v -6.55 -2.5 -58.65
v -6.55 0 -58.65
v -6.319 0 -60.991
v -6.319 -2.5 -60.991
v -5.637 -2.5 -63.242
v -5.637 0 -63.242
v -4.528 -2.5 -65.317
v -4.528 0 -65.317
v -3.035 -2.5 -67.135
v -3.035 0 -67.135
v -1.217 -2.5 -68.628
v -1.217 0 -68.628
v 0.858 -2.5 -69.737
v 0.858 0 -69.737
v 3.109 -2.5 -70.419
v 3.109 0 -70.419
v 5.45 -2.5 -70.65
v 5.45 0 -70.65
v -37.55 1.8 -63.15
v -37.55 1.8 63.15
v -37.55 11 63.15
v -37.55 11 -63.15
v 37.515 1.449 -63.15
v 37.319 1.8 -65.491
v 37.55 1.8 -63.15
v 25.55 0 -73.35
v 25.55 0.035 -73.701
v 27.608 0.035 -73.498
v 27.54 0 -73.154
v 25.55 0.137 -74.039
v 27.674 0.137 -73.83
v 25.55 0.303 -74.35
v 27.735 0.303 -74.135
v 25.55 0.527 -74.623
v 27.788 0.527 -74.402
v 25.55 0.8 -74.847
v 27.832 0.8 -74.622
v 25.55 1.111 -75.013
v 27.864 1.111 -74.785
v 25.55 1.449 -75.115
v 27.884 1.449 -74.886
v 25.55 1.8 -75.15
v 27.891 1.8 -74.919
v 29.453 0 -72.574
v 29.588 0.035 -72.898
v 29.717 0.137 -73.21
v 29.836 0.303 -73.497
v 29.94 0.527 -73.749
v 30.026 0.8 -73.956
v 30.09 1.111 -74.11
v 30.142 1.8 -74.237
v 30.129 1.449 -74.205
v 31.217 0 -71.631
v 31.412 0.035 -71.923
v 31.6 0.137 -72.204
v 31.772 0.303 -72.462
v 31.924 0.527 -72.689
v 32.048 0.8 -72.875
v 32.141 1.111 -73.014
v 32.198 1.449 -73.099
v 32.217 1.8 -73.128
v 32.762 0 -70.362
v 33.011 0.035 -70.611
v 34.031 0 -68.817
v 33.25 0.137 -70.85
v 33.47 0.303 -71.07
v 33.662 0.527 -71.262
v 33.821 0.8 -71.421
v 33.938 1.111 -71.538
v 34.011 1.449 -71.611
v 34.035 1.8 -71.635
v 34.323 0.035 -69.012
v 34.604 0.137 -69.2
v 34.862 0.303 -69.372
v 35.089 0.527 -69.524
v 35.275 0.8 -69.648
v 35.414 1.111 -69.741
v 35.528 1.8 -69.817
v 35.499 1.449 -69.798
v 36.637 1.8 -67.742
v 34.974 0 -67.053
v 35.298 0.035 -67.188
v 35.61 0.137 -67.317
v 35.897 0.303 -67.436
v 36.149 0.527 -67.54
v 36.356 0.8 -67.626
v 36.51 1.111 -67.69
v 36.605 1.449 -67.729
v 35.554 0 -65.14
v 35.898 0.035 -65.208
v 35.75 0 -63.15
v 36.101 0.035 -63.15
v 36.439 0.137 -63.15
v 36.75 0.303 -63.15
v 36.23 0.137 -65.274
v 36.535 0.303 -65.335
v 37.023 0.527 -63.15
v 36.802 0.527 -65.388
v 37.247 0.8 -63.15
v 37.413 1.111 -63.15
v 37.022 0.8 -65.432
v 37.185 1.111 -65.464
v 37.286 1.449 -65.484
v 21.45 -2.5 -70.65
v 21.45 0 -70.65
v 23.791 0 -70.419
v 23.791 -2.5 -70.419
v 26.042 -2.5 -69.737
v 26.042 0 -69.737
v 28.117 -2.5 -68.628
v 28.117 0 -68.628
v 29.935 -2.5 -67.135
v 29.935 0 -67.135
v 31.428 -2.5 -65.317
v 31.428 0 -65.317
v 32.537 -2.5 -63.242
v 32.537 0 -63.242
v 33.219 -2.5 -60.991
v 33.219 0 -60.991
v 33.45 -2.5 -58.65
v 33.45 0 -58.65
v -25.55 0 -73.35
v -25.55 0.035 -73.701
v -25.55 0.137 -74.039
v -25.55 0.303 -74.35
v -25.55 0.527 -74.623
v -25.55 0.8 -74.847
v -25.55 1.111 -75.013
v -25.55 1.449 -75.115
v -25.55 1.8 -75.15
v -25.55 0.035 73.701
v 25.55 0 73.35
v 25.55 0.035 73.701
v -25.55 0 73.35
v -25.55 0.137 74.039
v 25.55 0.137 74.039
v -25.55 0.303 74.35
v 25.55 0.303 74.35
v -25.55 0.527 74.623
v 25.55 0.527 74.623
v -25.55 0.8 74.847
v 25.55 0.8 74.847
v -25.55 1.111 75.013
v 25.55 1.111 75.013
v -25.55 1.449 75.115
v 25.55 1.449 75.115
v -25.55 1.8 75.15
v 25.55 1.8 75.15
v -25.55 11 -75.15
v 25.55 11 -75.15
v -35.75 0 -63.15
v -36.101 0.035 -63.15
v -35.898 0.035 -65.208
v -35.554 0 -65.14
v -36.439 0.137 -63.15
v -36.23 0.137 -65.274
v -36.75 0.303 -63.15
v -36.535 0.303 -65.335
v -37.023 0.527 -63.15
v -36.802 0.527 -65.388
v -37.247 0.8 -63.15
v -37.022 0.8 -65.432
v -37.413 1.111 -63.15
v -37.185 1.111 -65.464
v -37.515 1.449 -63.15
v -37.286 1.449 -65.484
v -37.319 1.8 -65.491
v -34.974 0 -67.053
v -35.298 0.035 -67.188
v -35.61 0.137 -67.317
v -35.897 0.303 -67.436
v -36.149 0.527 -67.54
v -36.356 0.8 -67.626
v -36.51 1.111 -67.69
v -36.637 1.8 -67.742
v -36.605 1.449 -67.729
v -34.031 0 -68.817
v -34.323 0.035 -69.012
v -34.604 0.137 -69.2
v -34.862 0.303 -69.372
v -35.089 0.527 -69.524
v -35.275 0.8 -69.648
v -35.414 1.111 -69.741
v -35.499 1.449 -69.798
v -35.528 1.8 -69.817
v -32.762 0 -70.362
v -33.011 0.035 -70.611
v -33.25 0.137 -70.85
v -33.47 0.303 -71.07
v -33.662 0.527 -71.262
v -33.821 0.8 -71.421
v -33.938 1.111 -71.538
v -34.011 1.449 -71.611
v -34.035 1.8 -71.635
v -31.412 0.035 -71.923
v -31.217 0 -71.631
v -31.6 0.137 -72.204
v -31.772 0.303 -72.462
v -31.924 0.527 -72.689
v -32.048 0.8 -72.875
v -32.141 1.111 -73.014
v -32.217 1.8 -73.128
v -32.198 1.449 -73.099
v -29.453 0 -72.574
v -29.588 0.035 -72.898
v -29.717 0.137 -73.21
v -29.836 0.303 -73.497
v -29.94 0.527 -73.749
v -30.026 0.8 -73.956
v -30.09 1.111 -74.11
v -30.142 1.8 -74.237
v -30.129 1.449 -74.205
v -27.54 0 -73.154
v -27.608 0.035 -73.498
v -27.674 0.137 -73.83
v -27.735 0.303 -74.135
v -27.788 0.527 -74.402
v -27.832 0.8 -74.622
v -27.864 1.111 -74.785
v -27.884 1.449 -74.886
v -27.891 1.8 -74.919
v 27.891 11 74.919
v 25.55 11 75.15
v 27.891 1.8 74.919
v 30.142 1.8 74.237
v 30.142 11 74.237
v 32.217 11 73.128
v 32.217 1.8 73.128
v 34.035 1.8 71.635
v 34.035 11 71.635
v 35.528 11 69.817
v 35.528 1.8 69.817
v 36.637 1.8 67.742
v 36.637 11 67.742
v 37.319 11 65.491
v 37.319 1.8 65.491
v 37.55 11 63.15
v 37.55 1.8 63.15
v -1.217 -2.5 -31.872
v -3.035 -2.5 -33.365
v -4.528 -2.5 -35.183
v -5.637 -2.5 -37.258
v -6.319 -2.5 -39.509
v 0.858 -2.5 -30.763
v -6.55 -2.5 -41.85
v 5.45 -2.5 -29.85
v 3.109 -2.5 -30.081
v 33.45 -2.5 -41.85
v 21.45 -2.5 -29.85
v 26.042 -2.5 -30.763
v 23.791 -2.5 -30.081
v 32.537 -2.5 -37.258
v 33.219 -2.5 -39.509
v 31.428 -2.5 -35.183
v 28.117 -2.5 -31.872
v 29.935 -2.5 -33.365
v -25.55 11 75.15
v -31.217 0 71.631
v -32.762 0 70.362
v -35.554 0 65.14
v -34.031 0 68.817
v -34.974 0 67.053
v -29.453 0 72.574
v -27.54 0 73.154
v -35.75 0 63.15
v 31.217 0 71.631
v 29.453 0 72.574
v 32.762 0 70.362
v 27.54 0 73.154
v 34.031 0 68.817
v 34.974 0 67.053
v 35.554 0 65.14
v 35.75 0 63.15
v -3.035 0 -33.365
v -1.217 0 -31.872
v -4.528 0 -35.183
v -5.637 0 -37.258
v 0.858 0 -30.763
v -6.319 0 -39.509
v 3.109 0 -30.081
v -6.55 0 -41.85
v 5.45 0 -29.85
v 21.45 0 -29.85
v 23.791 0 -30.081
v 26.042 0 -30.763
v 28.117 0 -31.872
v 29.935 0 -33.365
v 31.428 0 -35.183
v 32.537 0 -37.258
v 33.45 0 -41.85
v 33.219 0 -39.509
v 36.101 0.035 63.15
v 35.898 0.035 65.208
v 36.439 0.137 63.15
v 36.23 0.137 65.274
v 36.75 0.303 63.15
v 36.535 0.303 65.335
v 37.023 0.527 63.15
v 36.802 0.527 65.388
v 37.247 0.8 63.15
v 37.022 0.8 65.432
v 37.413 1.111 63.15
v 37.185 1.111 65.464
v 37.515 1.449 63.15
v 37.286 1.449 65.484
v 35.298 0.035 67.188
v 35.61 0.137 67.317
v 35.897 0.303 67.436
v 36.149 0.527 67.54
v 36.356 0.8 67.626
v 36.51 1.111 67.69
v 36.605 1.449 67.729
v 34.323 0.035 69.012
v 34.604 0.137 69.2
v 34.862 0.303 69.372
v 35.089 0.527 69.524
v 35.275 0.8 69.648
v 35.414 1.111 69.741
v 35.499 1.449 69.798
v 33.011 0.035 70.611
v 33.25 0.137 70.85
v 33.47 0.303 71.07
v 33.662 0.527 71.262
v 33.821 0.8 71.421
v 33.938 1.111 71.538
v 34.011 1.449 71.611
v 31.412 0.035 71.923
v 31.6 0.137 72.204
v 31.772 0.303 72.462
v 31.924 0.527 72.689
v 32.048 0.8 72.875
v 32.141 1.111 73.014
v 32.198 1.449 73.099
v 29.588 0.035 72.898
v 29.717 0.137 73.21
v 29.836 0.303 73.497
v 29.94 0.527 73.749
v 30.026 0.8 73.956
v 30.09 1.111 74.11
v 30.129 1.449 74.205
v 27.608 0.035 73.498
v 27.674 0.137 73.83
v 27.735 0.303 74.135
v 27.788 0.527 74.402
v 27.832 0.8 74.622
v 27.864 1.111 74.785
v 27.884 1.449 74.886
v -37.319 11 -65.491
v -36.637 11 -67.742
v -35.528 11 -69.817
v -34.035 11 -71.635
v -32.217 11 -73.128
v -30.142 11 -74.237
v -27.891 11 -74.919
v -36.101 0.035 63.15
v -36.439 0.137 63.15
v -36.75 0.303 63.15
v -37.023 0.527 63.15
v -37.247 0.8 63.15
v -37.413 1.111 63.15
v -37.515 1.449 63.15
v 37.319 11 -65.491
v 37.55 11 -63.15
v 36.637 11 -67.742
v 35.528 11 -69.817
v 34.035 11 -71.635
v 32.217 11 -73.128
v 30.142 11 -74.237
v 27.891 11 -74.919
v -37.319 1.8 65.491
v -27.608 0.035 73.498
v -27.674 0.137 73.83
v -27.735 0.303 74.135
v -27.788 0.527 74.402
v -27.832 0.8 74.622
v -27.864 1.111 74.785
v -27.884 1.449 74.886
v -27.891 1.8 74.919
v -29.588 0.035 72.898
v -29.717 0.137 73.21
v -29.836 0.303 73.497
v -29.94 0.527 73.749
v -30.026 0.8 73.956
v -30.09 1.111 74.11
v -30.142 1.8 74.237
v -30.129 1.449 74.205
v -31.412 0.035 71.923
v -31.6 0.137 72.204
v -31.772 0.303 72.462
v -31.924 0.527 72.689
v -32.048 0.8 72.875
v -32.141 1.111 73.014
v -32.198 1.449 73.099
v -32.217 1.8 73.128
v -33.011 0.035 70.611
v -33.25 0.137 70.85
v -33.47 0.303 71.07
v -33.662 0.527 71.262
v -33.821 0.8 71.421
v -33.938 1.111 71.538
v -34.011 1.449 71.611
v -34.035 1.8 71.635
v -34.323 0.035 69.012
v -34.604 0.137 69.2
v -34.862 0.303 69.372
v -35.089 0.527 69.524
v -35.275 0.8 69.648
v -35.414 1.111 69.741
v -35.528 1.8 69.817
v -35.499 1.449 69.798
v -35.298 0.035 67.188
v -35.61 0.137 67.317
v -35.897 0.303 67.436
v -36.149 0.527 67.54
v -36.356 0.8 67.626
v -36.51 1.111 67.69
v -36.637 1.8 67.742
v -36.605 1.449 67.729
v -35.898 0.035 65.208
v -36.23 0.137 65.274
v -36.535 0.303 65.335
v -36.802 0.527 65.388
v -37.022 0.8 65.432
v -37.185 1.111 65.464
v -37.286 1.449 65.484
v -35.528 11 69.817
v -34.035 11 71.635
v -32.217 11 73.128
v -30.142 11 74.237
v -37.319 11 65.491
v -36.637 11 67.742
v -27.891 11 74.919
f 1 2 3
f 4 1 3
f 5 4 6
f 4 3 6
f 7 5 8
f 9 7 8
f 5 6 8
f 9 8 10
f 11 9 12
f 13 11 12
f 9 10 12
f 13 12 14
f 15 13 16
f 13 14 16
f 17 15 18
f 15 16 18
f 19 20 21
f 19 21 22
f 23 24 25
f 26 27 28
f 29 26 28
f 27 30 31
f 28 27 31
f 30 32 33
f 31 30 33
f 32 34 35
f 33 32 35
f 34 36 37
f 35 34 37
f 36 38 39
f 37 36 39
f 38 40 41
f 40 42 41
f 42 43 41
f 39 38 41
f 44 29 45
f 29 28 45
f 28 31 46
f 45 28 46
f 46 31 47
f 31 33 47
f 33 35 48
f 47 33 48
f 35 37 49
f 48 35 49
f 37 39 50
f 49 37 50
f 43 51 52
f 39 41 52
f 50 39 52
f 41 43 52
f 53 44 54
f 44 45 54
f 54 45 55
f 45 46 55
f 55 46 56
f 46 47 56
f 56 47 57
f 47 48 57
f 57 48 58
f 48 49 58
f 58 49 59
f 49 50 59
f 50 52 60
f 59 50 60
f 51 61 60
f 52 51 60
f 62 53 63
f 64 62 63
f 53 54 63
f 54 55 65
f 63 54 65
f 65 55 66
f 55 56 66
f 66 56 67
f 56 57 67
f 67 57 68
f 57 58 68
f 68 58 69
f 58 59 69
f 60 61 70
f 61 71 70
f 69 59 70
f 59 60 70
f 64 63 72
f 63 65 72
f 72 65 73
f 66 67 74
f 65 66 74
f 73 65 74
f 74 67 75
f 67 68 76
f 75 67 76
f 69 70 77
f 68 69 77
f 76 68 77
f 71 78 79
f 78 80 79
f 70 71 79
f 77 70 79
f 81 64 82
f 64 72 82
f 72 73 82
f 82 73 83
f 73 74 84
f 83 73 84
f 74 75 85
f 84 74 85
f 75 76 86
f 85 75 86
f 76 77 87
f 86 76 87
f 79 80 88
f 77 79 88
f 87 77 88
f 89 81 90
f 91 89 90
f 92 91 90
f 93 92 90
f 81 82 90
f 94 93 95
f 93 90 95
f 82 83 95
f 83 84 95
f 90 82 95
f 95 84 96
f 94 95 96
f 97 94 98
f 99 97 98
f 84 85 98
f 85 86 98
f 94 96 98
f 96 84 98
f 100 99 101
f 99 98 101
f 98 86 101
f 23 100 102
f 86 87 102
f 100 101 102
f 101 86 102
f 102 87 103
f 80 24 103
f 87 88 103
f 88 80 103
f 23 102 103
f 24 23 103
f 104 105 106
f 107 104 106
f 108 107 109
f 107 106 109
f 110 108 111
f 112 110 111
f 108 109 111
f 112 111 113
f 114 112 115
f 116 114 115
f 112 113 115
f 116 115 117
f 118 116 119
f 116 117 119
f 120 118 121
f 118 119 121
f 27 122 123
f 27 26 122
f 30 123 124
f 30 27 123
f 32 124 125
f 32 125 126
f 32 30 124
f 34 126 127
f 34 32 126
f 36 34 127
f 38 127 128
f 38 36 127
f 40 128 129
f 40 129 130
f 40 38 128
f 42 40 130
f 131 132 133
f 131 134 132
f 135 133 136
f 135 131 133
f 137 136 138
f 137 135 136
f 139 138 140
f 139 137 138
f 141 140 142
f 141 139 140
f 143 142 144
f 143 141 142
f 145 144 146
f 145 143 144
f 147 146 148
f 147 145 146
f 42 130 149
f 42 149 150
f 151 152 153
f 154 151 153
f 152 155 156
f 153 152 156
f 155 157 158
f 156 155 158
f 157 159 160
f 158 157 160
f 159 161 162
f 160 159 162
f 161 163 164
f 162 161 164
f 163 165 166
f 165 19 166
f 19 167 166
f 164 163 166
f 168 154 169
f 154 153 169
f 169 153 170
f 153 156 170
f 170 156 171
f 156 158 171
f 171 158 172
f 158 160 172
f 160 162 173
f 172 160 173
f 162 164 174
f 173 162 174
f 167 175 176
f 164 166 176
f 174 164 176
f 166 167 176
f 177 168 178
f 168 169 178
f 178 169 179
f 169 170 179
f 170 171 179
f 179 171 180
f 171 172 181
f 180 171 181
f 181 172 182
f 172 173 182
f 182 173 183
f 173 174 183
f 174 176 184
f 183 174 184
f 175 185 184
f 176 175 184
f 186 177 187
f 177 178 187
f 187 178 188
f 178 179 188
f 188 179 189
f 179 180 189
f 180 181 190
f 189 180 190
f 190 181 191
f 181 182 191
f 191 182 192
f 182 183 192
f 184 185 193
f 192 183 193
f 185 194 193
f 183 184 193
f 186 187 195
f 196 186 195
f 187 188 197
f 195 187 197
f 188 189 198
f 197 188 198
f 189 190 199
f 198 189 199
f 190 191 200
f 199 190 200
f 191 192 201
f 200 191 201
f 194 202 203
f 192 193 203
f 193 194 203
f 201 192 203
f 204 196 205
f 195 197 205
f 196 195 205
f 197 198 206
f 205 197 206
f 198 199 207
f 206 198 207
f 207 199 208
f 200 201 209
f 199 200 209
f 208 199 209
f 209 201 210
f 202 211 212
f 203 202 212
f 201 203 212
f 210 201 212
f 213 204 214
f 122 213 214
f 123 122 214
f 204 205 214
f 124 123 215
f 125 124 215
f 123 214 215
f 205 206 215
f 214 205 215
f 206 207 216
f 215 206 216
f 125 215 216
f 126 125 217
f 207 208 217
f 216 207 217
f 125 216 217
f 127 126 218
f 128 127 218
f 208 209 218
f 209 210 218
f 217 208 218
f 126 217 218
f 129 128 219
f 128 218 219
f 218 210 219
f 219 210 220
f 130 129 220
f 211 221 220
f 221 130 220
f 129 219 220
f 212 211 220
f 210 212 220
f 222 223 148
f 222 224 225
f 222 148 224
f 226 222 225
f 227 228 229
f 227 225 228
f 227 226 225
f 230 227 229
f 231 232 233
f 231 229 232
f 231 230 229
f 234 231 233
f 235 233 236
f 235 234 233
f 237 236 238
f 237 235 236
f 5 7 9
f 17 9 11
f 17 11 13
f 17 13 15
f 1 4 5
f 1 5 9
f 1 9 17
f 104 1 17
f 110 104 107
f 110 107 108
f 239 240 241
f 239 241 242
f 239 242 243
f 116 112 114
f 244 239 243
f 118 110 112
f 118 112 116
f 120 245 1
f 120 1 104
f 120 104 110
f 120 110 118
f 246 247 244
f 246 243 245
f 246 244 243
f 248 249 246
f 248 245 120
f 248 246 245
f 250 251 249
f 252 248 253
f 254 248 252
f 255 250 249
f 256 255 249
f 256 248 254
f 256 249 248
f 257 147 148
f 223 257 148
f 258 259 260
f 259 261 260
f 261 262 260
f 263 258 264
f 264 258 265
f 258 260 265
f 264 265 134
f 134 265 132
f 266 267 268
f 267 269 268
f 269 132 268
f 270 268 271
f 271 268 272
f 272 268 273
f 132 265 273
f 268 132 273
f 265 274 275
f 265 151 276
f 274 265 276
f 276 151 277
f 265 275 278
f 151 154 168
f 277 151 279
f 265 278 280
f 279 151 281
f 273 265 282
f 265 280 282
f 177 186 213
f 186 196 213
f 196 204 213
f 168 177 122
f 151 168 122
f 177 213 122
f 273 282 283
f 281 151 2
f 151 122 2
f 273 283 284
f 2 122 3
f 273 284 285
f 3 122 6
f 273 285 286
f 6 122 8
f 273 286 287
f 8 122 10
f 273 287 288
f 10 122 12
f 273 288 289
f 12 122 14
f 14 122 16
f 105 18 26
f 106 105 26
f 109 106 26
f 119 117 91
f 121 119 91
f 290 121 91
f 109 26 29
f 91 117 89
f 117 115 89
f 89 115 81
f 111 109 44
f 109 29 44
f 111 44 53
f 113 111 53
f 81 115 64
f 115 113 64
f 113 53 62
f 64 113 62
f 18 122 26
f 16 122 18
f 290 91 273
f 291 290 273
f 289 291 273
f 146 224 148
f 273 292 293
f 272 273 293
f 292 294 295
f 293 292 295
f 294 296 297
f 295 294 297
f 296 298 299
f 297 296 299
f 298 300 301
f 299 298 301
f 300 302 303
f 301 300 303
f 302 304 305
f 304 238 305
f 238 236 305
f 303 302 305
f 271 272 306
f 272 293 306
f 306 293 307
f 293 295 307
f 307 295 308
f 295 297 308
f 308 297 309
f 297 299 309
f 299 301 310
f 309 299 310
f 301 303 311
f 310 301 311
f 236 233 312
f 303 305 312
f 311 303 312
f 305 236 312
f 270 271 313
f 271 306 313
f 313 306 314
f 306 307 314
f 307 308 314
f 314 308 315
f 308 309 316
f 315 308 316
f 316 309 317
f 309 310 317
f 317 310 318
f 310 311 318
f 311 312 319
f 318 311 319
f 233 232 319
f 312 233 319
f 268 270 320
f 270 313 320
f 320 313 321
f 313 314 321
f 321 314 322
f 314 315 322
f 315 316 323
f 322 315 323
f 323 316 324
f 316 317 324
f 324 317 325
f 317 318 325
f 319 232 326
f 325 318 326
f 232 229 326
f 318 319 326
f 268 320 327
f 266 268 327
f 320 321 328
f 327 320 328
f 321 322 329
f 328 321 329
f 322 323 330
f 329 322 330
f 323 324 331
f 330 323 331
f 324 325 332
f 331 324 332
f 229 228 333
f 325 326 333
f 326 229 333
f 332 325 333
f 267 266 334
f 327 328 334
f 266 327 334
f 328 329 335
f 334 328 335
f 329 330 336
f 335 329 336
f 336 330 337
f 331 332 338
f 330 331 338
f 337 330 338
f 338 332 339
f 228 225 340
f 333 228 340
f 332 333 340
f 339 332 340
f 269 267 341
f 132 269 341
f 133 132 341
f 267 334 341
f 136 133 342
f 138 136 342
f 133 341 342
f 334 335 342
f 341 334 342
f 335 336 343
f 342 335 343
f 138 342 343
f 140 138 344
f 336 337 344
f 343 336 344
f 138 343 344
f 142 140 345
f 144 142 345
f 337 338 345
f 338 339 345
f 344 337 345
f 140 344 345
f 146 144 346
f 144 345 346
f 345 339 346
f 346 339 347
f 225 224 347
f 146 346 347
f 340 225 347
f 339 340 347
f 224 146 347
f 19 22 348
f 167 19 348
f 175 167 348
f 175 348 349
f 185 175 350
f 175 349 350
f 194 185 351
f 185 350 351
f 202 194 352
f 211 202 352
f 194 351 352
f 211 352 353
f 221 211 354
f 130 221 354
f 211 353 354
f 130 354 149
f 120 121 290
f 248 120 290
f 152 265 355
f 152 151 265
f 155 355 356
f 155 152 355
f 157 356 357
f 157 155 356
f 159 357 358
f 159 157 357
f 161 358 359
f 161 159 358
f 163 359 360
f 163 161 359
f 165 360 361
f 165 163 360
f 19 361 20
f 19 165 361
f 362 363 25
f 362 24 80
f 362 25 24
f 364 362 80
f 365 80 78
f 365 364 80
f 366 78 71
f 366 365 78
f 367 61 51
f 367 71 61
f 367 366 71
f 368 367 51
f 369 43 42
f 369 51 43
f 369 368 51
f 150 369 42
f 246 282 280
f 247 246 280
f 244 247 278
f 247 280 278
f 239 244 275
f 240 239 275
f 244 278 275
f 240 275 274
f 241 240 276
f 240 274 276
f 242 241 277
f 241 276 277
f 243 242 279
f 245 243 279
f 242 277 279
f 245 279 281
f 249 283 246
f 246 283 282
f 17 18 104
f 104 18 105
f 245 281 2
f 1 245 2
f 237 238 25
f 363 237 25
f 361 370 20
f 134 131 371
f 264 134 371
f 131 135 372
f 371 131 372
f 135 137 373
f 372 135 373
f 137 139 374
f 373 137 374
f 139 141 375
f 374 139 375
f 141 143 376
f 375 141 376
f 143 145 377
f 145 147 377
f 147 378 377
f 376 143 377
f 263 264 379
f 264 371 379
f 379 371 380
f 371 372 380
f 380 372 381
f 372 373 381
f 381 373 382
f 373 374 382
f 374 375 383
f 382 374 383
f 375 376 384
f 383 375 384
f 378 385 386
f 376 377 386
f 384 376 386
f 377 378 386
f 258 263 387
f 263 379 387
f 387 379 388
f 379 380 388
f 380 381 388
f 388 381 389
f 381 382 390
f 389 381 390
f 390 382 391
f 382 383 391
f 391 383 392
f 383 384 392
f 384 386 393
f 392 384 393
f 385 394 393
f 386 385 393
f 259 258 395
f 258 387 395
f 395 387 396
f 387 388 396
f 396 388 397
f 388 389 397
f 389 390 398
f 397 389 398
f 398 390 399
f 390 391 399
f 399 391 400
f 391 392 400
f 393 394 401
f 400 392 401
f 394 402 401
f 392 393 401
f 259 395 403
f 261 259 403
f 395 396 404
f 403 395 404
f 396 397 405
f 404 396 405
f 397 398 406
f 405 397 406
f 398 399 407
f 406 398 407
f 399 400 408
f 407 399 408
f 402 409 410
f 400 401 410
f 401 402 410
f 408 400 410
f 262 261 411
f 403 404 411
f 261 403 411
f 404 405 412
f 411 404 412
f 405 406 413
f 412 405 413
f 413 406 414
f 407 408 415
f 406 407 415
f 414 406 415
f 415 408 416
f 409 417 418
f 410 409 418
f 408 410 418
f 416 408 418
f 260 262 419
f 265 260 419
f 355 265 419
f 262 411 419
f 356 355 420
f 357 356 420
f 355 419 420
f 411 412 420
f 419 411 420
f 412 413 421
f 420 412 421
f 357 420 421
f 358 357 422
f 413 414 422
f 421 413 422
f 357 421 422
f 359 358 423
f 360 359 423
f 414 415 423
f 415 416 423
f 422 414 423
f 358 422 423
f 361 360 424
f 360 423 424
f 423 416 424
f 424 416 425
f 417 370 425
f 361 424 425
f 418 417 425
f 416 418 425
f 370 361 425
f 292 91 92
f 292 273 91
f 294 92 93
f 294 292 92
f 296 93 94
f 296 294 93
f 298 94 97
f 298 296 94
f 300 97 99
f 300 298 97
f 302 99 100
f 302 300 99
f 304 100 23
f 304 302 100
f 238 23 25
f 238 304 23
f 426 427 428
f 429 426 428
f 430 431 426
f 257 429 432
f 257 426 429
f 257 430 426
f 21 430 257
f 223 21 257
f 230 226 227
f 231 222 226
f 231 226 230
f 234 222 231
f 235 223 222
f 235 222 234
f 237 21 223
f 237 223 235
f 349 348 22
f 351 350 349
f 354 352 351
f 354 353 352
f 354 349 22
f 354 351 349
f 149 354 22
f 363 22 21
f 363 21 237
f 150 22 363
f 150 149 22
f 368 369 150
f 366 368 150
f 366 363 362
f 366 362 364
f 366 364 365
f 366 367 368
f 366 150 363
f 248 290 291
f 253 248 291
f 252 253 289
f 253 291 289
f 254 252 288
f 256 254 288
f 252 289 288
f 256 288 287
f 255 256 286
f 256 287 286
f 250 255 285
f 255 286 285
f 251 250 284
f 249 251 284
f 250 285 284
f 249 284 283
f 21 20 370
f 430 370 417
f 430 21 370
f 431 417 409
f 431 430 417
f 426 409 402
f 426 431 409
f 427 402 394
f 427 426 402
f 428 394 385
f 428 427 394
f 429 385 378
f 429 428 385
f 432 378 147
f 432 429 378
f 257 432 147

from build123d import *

# Parameters (mm, degrees)
SKETCH_1_W      = 75.1
SKETCH_1_H      = 150.3
EXTRUDE_1_DEPTH = 11
FILLET_1_R      = 12
FILLET_2_R      = 1.8
EXTRUDE_2_DEPTH = 2.5


with BuildPart() as part:
    # 草图1 → 凸台-拉伸1 (new body)
    with BuildSketch(Plane(origin=(0, 0, 0), x_dir=(1, 0, 0), z_dir=(0, 1, 0))):
        Rectangle(SKETCH_1_W, SKETCH_1_H)
    extrude(amount=EXTRUDE_1_DEPTH)

    # 圆角1
    fillet_1_edges = [part.edges().sort_by_distance(p)[0] for p in [
        (37.55, 5.5, 75.15),
        (-37.55, 5.5, 75.15),
        (-37.55, 5.5, -75.15),
        (37.55, 5.5, -75.15),
    ]]
    fillet(fillet_1_edges, radius=FILLET_1_R)

    # 圆角2
    fillet_2_edges = [part.edges().sort_by_distance(p)[0] for p in [
        (0, 0, -75.15),
        (37.55, 0, 0),
        (0, 0, 75.15),
        (-37.55, 0, 0),
        (-34.035281374, 0, -71.635281374),
        (-34.035281374, 0, 71.635281374),
        (34.035281374, 0, 71.635281374),
        (34.035281374, 0, -71.635281374),
    ]]
    fillet(fillet_2_edges, radius=FILLET_2_R)

    # 草图2 → 凸台-拉伸2 (add)
    with BuildSketch(Plane.XZ):
        with BuildLine():
            Line((21.45, -29.85), (5.45, -29.85))
            ThreePointArc((5.45, -29.85), (-3.035281374, -33.364718626), (-6.55, -41.85))
            Line((-6.55, -41.85), (-6.55, -58.65))
            ThreePointArc((-6.55, -58.65), (-3.035281374, -67.135281374), (5.45, -70.65))
            Line((5.45, -70.65), (21.45, -70.65))
            ThreePointArc((21.45, -70.65), (29.935281374, -67.135281374), (33.45, -58.65))
            Line((33.45, -58.65), (33.45, -41.85))
            ThreePointArc((33.45, -41.85), (29.935281374, -33.364718626), (21.45, -29.85))
        make_face()
    extrude(amount=EXTRUDE_2_DEPTH)


solid = part.part
